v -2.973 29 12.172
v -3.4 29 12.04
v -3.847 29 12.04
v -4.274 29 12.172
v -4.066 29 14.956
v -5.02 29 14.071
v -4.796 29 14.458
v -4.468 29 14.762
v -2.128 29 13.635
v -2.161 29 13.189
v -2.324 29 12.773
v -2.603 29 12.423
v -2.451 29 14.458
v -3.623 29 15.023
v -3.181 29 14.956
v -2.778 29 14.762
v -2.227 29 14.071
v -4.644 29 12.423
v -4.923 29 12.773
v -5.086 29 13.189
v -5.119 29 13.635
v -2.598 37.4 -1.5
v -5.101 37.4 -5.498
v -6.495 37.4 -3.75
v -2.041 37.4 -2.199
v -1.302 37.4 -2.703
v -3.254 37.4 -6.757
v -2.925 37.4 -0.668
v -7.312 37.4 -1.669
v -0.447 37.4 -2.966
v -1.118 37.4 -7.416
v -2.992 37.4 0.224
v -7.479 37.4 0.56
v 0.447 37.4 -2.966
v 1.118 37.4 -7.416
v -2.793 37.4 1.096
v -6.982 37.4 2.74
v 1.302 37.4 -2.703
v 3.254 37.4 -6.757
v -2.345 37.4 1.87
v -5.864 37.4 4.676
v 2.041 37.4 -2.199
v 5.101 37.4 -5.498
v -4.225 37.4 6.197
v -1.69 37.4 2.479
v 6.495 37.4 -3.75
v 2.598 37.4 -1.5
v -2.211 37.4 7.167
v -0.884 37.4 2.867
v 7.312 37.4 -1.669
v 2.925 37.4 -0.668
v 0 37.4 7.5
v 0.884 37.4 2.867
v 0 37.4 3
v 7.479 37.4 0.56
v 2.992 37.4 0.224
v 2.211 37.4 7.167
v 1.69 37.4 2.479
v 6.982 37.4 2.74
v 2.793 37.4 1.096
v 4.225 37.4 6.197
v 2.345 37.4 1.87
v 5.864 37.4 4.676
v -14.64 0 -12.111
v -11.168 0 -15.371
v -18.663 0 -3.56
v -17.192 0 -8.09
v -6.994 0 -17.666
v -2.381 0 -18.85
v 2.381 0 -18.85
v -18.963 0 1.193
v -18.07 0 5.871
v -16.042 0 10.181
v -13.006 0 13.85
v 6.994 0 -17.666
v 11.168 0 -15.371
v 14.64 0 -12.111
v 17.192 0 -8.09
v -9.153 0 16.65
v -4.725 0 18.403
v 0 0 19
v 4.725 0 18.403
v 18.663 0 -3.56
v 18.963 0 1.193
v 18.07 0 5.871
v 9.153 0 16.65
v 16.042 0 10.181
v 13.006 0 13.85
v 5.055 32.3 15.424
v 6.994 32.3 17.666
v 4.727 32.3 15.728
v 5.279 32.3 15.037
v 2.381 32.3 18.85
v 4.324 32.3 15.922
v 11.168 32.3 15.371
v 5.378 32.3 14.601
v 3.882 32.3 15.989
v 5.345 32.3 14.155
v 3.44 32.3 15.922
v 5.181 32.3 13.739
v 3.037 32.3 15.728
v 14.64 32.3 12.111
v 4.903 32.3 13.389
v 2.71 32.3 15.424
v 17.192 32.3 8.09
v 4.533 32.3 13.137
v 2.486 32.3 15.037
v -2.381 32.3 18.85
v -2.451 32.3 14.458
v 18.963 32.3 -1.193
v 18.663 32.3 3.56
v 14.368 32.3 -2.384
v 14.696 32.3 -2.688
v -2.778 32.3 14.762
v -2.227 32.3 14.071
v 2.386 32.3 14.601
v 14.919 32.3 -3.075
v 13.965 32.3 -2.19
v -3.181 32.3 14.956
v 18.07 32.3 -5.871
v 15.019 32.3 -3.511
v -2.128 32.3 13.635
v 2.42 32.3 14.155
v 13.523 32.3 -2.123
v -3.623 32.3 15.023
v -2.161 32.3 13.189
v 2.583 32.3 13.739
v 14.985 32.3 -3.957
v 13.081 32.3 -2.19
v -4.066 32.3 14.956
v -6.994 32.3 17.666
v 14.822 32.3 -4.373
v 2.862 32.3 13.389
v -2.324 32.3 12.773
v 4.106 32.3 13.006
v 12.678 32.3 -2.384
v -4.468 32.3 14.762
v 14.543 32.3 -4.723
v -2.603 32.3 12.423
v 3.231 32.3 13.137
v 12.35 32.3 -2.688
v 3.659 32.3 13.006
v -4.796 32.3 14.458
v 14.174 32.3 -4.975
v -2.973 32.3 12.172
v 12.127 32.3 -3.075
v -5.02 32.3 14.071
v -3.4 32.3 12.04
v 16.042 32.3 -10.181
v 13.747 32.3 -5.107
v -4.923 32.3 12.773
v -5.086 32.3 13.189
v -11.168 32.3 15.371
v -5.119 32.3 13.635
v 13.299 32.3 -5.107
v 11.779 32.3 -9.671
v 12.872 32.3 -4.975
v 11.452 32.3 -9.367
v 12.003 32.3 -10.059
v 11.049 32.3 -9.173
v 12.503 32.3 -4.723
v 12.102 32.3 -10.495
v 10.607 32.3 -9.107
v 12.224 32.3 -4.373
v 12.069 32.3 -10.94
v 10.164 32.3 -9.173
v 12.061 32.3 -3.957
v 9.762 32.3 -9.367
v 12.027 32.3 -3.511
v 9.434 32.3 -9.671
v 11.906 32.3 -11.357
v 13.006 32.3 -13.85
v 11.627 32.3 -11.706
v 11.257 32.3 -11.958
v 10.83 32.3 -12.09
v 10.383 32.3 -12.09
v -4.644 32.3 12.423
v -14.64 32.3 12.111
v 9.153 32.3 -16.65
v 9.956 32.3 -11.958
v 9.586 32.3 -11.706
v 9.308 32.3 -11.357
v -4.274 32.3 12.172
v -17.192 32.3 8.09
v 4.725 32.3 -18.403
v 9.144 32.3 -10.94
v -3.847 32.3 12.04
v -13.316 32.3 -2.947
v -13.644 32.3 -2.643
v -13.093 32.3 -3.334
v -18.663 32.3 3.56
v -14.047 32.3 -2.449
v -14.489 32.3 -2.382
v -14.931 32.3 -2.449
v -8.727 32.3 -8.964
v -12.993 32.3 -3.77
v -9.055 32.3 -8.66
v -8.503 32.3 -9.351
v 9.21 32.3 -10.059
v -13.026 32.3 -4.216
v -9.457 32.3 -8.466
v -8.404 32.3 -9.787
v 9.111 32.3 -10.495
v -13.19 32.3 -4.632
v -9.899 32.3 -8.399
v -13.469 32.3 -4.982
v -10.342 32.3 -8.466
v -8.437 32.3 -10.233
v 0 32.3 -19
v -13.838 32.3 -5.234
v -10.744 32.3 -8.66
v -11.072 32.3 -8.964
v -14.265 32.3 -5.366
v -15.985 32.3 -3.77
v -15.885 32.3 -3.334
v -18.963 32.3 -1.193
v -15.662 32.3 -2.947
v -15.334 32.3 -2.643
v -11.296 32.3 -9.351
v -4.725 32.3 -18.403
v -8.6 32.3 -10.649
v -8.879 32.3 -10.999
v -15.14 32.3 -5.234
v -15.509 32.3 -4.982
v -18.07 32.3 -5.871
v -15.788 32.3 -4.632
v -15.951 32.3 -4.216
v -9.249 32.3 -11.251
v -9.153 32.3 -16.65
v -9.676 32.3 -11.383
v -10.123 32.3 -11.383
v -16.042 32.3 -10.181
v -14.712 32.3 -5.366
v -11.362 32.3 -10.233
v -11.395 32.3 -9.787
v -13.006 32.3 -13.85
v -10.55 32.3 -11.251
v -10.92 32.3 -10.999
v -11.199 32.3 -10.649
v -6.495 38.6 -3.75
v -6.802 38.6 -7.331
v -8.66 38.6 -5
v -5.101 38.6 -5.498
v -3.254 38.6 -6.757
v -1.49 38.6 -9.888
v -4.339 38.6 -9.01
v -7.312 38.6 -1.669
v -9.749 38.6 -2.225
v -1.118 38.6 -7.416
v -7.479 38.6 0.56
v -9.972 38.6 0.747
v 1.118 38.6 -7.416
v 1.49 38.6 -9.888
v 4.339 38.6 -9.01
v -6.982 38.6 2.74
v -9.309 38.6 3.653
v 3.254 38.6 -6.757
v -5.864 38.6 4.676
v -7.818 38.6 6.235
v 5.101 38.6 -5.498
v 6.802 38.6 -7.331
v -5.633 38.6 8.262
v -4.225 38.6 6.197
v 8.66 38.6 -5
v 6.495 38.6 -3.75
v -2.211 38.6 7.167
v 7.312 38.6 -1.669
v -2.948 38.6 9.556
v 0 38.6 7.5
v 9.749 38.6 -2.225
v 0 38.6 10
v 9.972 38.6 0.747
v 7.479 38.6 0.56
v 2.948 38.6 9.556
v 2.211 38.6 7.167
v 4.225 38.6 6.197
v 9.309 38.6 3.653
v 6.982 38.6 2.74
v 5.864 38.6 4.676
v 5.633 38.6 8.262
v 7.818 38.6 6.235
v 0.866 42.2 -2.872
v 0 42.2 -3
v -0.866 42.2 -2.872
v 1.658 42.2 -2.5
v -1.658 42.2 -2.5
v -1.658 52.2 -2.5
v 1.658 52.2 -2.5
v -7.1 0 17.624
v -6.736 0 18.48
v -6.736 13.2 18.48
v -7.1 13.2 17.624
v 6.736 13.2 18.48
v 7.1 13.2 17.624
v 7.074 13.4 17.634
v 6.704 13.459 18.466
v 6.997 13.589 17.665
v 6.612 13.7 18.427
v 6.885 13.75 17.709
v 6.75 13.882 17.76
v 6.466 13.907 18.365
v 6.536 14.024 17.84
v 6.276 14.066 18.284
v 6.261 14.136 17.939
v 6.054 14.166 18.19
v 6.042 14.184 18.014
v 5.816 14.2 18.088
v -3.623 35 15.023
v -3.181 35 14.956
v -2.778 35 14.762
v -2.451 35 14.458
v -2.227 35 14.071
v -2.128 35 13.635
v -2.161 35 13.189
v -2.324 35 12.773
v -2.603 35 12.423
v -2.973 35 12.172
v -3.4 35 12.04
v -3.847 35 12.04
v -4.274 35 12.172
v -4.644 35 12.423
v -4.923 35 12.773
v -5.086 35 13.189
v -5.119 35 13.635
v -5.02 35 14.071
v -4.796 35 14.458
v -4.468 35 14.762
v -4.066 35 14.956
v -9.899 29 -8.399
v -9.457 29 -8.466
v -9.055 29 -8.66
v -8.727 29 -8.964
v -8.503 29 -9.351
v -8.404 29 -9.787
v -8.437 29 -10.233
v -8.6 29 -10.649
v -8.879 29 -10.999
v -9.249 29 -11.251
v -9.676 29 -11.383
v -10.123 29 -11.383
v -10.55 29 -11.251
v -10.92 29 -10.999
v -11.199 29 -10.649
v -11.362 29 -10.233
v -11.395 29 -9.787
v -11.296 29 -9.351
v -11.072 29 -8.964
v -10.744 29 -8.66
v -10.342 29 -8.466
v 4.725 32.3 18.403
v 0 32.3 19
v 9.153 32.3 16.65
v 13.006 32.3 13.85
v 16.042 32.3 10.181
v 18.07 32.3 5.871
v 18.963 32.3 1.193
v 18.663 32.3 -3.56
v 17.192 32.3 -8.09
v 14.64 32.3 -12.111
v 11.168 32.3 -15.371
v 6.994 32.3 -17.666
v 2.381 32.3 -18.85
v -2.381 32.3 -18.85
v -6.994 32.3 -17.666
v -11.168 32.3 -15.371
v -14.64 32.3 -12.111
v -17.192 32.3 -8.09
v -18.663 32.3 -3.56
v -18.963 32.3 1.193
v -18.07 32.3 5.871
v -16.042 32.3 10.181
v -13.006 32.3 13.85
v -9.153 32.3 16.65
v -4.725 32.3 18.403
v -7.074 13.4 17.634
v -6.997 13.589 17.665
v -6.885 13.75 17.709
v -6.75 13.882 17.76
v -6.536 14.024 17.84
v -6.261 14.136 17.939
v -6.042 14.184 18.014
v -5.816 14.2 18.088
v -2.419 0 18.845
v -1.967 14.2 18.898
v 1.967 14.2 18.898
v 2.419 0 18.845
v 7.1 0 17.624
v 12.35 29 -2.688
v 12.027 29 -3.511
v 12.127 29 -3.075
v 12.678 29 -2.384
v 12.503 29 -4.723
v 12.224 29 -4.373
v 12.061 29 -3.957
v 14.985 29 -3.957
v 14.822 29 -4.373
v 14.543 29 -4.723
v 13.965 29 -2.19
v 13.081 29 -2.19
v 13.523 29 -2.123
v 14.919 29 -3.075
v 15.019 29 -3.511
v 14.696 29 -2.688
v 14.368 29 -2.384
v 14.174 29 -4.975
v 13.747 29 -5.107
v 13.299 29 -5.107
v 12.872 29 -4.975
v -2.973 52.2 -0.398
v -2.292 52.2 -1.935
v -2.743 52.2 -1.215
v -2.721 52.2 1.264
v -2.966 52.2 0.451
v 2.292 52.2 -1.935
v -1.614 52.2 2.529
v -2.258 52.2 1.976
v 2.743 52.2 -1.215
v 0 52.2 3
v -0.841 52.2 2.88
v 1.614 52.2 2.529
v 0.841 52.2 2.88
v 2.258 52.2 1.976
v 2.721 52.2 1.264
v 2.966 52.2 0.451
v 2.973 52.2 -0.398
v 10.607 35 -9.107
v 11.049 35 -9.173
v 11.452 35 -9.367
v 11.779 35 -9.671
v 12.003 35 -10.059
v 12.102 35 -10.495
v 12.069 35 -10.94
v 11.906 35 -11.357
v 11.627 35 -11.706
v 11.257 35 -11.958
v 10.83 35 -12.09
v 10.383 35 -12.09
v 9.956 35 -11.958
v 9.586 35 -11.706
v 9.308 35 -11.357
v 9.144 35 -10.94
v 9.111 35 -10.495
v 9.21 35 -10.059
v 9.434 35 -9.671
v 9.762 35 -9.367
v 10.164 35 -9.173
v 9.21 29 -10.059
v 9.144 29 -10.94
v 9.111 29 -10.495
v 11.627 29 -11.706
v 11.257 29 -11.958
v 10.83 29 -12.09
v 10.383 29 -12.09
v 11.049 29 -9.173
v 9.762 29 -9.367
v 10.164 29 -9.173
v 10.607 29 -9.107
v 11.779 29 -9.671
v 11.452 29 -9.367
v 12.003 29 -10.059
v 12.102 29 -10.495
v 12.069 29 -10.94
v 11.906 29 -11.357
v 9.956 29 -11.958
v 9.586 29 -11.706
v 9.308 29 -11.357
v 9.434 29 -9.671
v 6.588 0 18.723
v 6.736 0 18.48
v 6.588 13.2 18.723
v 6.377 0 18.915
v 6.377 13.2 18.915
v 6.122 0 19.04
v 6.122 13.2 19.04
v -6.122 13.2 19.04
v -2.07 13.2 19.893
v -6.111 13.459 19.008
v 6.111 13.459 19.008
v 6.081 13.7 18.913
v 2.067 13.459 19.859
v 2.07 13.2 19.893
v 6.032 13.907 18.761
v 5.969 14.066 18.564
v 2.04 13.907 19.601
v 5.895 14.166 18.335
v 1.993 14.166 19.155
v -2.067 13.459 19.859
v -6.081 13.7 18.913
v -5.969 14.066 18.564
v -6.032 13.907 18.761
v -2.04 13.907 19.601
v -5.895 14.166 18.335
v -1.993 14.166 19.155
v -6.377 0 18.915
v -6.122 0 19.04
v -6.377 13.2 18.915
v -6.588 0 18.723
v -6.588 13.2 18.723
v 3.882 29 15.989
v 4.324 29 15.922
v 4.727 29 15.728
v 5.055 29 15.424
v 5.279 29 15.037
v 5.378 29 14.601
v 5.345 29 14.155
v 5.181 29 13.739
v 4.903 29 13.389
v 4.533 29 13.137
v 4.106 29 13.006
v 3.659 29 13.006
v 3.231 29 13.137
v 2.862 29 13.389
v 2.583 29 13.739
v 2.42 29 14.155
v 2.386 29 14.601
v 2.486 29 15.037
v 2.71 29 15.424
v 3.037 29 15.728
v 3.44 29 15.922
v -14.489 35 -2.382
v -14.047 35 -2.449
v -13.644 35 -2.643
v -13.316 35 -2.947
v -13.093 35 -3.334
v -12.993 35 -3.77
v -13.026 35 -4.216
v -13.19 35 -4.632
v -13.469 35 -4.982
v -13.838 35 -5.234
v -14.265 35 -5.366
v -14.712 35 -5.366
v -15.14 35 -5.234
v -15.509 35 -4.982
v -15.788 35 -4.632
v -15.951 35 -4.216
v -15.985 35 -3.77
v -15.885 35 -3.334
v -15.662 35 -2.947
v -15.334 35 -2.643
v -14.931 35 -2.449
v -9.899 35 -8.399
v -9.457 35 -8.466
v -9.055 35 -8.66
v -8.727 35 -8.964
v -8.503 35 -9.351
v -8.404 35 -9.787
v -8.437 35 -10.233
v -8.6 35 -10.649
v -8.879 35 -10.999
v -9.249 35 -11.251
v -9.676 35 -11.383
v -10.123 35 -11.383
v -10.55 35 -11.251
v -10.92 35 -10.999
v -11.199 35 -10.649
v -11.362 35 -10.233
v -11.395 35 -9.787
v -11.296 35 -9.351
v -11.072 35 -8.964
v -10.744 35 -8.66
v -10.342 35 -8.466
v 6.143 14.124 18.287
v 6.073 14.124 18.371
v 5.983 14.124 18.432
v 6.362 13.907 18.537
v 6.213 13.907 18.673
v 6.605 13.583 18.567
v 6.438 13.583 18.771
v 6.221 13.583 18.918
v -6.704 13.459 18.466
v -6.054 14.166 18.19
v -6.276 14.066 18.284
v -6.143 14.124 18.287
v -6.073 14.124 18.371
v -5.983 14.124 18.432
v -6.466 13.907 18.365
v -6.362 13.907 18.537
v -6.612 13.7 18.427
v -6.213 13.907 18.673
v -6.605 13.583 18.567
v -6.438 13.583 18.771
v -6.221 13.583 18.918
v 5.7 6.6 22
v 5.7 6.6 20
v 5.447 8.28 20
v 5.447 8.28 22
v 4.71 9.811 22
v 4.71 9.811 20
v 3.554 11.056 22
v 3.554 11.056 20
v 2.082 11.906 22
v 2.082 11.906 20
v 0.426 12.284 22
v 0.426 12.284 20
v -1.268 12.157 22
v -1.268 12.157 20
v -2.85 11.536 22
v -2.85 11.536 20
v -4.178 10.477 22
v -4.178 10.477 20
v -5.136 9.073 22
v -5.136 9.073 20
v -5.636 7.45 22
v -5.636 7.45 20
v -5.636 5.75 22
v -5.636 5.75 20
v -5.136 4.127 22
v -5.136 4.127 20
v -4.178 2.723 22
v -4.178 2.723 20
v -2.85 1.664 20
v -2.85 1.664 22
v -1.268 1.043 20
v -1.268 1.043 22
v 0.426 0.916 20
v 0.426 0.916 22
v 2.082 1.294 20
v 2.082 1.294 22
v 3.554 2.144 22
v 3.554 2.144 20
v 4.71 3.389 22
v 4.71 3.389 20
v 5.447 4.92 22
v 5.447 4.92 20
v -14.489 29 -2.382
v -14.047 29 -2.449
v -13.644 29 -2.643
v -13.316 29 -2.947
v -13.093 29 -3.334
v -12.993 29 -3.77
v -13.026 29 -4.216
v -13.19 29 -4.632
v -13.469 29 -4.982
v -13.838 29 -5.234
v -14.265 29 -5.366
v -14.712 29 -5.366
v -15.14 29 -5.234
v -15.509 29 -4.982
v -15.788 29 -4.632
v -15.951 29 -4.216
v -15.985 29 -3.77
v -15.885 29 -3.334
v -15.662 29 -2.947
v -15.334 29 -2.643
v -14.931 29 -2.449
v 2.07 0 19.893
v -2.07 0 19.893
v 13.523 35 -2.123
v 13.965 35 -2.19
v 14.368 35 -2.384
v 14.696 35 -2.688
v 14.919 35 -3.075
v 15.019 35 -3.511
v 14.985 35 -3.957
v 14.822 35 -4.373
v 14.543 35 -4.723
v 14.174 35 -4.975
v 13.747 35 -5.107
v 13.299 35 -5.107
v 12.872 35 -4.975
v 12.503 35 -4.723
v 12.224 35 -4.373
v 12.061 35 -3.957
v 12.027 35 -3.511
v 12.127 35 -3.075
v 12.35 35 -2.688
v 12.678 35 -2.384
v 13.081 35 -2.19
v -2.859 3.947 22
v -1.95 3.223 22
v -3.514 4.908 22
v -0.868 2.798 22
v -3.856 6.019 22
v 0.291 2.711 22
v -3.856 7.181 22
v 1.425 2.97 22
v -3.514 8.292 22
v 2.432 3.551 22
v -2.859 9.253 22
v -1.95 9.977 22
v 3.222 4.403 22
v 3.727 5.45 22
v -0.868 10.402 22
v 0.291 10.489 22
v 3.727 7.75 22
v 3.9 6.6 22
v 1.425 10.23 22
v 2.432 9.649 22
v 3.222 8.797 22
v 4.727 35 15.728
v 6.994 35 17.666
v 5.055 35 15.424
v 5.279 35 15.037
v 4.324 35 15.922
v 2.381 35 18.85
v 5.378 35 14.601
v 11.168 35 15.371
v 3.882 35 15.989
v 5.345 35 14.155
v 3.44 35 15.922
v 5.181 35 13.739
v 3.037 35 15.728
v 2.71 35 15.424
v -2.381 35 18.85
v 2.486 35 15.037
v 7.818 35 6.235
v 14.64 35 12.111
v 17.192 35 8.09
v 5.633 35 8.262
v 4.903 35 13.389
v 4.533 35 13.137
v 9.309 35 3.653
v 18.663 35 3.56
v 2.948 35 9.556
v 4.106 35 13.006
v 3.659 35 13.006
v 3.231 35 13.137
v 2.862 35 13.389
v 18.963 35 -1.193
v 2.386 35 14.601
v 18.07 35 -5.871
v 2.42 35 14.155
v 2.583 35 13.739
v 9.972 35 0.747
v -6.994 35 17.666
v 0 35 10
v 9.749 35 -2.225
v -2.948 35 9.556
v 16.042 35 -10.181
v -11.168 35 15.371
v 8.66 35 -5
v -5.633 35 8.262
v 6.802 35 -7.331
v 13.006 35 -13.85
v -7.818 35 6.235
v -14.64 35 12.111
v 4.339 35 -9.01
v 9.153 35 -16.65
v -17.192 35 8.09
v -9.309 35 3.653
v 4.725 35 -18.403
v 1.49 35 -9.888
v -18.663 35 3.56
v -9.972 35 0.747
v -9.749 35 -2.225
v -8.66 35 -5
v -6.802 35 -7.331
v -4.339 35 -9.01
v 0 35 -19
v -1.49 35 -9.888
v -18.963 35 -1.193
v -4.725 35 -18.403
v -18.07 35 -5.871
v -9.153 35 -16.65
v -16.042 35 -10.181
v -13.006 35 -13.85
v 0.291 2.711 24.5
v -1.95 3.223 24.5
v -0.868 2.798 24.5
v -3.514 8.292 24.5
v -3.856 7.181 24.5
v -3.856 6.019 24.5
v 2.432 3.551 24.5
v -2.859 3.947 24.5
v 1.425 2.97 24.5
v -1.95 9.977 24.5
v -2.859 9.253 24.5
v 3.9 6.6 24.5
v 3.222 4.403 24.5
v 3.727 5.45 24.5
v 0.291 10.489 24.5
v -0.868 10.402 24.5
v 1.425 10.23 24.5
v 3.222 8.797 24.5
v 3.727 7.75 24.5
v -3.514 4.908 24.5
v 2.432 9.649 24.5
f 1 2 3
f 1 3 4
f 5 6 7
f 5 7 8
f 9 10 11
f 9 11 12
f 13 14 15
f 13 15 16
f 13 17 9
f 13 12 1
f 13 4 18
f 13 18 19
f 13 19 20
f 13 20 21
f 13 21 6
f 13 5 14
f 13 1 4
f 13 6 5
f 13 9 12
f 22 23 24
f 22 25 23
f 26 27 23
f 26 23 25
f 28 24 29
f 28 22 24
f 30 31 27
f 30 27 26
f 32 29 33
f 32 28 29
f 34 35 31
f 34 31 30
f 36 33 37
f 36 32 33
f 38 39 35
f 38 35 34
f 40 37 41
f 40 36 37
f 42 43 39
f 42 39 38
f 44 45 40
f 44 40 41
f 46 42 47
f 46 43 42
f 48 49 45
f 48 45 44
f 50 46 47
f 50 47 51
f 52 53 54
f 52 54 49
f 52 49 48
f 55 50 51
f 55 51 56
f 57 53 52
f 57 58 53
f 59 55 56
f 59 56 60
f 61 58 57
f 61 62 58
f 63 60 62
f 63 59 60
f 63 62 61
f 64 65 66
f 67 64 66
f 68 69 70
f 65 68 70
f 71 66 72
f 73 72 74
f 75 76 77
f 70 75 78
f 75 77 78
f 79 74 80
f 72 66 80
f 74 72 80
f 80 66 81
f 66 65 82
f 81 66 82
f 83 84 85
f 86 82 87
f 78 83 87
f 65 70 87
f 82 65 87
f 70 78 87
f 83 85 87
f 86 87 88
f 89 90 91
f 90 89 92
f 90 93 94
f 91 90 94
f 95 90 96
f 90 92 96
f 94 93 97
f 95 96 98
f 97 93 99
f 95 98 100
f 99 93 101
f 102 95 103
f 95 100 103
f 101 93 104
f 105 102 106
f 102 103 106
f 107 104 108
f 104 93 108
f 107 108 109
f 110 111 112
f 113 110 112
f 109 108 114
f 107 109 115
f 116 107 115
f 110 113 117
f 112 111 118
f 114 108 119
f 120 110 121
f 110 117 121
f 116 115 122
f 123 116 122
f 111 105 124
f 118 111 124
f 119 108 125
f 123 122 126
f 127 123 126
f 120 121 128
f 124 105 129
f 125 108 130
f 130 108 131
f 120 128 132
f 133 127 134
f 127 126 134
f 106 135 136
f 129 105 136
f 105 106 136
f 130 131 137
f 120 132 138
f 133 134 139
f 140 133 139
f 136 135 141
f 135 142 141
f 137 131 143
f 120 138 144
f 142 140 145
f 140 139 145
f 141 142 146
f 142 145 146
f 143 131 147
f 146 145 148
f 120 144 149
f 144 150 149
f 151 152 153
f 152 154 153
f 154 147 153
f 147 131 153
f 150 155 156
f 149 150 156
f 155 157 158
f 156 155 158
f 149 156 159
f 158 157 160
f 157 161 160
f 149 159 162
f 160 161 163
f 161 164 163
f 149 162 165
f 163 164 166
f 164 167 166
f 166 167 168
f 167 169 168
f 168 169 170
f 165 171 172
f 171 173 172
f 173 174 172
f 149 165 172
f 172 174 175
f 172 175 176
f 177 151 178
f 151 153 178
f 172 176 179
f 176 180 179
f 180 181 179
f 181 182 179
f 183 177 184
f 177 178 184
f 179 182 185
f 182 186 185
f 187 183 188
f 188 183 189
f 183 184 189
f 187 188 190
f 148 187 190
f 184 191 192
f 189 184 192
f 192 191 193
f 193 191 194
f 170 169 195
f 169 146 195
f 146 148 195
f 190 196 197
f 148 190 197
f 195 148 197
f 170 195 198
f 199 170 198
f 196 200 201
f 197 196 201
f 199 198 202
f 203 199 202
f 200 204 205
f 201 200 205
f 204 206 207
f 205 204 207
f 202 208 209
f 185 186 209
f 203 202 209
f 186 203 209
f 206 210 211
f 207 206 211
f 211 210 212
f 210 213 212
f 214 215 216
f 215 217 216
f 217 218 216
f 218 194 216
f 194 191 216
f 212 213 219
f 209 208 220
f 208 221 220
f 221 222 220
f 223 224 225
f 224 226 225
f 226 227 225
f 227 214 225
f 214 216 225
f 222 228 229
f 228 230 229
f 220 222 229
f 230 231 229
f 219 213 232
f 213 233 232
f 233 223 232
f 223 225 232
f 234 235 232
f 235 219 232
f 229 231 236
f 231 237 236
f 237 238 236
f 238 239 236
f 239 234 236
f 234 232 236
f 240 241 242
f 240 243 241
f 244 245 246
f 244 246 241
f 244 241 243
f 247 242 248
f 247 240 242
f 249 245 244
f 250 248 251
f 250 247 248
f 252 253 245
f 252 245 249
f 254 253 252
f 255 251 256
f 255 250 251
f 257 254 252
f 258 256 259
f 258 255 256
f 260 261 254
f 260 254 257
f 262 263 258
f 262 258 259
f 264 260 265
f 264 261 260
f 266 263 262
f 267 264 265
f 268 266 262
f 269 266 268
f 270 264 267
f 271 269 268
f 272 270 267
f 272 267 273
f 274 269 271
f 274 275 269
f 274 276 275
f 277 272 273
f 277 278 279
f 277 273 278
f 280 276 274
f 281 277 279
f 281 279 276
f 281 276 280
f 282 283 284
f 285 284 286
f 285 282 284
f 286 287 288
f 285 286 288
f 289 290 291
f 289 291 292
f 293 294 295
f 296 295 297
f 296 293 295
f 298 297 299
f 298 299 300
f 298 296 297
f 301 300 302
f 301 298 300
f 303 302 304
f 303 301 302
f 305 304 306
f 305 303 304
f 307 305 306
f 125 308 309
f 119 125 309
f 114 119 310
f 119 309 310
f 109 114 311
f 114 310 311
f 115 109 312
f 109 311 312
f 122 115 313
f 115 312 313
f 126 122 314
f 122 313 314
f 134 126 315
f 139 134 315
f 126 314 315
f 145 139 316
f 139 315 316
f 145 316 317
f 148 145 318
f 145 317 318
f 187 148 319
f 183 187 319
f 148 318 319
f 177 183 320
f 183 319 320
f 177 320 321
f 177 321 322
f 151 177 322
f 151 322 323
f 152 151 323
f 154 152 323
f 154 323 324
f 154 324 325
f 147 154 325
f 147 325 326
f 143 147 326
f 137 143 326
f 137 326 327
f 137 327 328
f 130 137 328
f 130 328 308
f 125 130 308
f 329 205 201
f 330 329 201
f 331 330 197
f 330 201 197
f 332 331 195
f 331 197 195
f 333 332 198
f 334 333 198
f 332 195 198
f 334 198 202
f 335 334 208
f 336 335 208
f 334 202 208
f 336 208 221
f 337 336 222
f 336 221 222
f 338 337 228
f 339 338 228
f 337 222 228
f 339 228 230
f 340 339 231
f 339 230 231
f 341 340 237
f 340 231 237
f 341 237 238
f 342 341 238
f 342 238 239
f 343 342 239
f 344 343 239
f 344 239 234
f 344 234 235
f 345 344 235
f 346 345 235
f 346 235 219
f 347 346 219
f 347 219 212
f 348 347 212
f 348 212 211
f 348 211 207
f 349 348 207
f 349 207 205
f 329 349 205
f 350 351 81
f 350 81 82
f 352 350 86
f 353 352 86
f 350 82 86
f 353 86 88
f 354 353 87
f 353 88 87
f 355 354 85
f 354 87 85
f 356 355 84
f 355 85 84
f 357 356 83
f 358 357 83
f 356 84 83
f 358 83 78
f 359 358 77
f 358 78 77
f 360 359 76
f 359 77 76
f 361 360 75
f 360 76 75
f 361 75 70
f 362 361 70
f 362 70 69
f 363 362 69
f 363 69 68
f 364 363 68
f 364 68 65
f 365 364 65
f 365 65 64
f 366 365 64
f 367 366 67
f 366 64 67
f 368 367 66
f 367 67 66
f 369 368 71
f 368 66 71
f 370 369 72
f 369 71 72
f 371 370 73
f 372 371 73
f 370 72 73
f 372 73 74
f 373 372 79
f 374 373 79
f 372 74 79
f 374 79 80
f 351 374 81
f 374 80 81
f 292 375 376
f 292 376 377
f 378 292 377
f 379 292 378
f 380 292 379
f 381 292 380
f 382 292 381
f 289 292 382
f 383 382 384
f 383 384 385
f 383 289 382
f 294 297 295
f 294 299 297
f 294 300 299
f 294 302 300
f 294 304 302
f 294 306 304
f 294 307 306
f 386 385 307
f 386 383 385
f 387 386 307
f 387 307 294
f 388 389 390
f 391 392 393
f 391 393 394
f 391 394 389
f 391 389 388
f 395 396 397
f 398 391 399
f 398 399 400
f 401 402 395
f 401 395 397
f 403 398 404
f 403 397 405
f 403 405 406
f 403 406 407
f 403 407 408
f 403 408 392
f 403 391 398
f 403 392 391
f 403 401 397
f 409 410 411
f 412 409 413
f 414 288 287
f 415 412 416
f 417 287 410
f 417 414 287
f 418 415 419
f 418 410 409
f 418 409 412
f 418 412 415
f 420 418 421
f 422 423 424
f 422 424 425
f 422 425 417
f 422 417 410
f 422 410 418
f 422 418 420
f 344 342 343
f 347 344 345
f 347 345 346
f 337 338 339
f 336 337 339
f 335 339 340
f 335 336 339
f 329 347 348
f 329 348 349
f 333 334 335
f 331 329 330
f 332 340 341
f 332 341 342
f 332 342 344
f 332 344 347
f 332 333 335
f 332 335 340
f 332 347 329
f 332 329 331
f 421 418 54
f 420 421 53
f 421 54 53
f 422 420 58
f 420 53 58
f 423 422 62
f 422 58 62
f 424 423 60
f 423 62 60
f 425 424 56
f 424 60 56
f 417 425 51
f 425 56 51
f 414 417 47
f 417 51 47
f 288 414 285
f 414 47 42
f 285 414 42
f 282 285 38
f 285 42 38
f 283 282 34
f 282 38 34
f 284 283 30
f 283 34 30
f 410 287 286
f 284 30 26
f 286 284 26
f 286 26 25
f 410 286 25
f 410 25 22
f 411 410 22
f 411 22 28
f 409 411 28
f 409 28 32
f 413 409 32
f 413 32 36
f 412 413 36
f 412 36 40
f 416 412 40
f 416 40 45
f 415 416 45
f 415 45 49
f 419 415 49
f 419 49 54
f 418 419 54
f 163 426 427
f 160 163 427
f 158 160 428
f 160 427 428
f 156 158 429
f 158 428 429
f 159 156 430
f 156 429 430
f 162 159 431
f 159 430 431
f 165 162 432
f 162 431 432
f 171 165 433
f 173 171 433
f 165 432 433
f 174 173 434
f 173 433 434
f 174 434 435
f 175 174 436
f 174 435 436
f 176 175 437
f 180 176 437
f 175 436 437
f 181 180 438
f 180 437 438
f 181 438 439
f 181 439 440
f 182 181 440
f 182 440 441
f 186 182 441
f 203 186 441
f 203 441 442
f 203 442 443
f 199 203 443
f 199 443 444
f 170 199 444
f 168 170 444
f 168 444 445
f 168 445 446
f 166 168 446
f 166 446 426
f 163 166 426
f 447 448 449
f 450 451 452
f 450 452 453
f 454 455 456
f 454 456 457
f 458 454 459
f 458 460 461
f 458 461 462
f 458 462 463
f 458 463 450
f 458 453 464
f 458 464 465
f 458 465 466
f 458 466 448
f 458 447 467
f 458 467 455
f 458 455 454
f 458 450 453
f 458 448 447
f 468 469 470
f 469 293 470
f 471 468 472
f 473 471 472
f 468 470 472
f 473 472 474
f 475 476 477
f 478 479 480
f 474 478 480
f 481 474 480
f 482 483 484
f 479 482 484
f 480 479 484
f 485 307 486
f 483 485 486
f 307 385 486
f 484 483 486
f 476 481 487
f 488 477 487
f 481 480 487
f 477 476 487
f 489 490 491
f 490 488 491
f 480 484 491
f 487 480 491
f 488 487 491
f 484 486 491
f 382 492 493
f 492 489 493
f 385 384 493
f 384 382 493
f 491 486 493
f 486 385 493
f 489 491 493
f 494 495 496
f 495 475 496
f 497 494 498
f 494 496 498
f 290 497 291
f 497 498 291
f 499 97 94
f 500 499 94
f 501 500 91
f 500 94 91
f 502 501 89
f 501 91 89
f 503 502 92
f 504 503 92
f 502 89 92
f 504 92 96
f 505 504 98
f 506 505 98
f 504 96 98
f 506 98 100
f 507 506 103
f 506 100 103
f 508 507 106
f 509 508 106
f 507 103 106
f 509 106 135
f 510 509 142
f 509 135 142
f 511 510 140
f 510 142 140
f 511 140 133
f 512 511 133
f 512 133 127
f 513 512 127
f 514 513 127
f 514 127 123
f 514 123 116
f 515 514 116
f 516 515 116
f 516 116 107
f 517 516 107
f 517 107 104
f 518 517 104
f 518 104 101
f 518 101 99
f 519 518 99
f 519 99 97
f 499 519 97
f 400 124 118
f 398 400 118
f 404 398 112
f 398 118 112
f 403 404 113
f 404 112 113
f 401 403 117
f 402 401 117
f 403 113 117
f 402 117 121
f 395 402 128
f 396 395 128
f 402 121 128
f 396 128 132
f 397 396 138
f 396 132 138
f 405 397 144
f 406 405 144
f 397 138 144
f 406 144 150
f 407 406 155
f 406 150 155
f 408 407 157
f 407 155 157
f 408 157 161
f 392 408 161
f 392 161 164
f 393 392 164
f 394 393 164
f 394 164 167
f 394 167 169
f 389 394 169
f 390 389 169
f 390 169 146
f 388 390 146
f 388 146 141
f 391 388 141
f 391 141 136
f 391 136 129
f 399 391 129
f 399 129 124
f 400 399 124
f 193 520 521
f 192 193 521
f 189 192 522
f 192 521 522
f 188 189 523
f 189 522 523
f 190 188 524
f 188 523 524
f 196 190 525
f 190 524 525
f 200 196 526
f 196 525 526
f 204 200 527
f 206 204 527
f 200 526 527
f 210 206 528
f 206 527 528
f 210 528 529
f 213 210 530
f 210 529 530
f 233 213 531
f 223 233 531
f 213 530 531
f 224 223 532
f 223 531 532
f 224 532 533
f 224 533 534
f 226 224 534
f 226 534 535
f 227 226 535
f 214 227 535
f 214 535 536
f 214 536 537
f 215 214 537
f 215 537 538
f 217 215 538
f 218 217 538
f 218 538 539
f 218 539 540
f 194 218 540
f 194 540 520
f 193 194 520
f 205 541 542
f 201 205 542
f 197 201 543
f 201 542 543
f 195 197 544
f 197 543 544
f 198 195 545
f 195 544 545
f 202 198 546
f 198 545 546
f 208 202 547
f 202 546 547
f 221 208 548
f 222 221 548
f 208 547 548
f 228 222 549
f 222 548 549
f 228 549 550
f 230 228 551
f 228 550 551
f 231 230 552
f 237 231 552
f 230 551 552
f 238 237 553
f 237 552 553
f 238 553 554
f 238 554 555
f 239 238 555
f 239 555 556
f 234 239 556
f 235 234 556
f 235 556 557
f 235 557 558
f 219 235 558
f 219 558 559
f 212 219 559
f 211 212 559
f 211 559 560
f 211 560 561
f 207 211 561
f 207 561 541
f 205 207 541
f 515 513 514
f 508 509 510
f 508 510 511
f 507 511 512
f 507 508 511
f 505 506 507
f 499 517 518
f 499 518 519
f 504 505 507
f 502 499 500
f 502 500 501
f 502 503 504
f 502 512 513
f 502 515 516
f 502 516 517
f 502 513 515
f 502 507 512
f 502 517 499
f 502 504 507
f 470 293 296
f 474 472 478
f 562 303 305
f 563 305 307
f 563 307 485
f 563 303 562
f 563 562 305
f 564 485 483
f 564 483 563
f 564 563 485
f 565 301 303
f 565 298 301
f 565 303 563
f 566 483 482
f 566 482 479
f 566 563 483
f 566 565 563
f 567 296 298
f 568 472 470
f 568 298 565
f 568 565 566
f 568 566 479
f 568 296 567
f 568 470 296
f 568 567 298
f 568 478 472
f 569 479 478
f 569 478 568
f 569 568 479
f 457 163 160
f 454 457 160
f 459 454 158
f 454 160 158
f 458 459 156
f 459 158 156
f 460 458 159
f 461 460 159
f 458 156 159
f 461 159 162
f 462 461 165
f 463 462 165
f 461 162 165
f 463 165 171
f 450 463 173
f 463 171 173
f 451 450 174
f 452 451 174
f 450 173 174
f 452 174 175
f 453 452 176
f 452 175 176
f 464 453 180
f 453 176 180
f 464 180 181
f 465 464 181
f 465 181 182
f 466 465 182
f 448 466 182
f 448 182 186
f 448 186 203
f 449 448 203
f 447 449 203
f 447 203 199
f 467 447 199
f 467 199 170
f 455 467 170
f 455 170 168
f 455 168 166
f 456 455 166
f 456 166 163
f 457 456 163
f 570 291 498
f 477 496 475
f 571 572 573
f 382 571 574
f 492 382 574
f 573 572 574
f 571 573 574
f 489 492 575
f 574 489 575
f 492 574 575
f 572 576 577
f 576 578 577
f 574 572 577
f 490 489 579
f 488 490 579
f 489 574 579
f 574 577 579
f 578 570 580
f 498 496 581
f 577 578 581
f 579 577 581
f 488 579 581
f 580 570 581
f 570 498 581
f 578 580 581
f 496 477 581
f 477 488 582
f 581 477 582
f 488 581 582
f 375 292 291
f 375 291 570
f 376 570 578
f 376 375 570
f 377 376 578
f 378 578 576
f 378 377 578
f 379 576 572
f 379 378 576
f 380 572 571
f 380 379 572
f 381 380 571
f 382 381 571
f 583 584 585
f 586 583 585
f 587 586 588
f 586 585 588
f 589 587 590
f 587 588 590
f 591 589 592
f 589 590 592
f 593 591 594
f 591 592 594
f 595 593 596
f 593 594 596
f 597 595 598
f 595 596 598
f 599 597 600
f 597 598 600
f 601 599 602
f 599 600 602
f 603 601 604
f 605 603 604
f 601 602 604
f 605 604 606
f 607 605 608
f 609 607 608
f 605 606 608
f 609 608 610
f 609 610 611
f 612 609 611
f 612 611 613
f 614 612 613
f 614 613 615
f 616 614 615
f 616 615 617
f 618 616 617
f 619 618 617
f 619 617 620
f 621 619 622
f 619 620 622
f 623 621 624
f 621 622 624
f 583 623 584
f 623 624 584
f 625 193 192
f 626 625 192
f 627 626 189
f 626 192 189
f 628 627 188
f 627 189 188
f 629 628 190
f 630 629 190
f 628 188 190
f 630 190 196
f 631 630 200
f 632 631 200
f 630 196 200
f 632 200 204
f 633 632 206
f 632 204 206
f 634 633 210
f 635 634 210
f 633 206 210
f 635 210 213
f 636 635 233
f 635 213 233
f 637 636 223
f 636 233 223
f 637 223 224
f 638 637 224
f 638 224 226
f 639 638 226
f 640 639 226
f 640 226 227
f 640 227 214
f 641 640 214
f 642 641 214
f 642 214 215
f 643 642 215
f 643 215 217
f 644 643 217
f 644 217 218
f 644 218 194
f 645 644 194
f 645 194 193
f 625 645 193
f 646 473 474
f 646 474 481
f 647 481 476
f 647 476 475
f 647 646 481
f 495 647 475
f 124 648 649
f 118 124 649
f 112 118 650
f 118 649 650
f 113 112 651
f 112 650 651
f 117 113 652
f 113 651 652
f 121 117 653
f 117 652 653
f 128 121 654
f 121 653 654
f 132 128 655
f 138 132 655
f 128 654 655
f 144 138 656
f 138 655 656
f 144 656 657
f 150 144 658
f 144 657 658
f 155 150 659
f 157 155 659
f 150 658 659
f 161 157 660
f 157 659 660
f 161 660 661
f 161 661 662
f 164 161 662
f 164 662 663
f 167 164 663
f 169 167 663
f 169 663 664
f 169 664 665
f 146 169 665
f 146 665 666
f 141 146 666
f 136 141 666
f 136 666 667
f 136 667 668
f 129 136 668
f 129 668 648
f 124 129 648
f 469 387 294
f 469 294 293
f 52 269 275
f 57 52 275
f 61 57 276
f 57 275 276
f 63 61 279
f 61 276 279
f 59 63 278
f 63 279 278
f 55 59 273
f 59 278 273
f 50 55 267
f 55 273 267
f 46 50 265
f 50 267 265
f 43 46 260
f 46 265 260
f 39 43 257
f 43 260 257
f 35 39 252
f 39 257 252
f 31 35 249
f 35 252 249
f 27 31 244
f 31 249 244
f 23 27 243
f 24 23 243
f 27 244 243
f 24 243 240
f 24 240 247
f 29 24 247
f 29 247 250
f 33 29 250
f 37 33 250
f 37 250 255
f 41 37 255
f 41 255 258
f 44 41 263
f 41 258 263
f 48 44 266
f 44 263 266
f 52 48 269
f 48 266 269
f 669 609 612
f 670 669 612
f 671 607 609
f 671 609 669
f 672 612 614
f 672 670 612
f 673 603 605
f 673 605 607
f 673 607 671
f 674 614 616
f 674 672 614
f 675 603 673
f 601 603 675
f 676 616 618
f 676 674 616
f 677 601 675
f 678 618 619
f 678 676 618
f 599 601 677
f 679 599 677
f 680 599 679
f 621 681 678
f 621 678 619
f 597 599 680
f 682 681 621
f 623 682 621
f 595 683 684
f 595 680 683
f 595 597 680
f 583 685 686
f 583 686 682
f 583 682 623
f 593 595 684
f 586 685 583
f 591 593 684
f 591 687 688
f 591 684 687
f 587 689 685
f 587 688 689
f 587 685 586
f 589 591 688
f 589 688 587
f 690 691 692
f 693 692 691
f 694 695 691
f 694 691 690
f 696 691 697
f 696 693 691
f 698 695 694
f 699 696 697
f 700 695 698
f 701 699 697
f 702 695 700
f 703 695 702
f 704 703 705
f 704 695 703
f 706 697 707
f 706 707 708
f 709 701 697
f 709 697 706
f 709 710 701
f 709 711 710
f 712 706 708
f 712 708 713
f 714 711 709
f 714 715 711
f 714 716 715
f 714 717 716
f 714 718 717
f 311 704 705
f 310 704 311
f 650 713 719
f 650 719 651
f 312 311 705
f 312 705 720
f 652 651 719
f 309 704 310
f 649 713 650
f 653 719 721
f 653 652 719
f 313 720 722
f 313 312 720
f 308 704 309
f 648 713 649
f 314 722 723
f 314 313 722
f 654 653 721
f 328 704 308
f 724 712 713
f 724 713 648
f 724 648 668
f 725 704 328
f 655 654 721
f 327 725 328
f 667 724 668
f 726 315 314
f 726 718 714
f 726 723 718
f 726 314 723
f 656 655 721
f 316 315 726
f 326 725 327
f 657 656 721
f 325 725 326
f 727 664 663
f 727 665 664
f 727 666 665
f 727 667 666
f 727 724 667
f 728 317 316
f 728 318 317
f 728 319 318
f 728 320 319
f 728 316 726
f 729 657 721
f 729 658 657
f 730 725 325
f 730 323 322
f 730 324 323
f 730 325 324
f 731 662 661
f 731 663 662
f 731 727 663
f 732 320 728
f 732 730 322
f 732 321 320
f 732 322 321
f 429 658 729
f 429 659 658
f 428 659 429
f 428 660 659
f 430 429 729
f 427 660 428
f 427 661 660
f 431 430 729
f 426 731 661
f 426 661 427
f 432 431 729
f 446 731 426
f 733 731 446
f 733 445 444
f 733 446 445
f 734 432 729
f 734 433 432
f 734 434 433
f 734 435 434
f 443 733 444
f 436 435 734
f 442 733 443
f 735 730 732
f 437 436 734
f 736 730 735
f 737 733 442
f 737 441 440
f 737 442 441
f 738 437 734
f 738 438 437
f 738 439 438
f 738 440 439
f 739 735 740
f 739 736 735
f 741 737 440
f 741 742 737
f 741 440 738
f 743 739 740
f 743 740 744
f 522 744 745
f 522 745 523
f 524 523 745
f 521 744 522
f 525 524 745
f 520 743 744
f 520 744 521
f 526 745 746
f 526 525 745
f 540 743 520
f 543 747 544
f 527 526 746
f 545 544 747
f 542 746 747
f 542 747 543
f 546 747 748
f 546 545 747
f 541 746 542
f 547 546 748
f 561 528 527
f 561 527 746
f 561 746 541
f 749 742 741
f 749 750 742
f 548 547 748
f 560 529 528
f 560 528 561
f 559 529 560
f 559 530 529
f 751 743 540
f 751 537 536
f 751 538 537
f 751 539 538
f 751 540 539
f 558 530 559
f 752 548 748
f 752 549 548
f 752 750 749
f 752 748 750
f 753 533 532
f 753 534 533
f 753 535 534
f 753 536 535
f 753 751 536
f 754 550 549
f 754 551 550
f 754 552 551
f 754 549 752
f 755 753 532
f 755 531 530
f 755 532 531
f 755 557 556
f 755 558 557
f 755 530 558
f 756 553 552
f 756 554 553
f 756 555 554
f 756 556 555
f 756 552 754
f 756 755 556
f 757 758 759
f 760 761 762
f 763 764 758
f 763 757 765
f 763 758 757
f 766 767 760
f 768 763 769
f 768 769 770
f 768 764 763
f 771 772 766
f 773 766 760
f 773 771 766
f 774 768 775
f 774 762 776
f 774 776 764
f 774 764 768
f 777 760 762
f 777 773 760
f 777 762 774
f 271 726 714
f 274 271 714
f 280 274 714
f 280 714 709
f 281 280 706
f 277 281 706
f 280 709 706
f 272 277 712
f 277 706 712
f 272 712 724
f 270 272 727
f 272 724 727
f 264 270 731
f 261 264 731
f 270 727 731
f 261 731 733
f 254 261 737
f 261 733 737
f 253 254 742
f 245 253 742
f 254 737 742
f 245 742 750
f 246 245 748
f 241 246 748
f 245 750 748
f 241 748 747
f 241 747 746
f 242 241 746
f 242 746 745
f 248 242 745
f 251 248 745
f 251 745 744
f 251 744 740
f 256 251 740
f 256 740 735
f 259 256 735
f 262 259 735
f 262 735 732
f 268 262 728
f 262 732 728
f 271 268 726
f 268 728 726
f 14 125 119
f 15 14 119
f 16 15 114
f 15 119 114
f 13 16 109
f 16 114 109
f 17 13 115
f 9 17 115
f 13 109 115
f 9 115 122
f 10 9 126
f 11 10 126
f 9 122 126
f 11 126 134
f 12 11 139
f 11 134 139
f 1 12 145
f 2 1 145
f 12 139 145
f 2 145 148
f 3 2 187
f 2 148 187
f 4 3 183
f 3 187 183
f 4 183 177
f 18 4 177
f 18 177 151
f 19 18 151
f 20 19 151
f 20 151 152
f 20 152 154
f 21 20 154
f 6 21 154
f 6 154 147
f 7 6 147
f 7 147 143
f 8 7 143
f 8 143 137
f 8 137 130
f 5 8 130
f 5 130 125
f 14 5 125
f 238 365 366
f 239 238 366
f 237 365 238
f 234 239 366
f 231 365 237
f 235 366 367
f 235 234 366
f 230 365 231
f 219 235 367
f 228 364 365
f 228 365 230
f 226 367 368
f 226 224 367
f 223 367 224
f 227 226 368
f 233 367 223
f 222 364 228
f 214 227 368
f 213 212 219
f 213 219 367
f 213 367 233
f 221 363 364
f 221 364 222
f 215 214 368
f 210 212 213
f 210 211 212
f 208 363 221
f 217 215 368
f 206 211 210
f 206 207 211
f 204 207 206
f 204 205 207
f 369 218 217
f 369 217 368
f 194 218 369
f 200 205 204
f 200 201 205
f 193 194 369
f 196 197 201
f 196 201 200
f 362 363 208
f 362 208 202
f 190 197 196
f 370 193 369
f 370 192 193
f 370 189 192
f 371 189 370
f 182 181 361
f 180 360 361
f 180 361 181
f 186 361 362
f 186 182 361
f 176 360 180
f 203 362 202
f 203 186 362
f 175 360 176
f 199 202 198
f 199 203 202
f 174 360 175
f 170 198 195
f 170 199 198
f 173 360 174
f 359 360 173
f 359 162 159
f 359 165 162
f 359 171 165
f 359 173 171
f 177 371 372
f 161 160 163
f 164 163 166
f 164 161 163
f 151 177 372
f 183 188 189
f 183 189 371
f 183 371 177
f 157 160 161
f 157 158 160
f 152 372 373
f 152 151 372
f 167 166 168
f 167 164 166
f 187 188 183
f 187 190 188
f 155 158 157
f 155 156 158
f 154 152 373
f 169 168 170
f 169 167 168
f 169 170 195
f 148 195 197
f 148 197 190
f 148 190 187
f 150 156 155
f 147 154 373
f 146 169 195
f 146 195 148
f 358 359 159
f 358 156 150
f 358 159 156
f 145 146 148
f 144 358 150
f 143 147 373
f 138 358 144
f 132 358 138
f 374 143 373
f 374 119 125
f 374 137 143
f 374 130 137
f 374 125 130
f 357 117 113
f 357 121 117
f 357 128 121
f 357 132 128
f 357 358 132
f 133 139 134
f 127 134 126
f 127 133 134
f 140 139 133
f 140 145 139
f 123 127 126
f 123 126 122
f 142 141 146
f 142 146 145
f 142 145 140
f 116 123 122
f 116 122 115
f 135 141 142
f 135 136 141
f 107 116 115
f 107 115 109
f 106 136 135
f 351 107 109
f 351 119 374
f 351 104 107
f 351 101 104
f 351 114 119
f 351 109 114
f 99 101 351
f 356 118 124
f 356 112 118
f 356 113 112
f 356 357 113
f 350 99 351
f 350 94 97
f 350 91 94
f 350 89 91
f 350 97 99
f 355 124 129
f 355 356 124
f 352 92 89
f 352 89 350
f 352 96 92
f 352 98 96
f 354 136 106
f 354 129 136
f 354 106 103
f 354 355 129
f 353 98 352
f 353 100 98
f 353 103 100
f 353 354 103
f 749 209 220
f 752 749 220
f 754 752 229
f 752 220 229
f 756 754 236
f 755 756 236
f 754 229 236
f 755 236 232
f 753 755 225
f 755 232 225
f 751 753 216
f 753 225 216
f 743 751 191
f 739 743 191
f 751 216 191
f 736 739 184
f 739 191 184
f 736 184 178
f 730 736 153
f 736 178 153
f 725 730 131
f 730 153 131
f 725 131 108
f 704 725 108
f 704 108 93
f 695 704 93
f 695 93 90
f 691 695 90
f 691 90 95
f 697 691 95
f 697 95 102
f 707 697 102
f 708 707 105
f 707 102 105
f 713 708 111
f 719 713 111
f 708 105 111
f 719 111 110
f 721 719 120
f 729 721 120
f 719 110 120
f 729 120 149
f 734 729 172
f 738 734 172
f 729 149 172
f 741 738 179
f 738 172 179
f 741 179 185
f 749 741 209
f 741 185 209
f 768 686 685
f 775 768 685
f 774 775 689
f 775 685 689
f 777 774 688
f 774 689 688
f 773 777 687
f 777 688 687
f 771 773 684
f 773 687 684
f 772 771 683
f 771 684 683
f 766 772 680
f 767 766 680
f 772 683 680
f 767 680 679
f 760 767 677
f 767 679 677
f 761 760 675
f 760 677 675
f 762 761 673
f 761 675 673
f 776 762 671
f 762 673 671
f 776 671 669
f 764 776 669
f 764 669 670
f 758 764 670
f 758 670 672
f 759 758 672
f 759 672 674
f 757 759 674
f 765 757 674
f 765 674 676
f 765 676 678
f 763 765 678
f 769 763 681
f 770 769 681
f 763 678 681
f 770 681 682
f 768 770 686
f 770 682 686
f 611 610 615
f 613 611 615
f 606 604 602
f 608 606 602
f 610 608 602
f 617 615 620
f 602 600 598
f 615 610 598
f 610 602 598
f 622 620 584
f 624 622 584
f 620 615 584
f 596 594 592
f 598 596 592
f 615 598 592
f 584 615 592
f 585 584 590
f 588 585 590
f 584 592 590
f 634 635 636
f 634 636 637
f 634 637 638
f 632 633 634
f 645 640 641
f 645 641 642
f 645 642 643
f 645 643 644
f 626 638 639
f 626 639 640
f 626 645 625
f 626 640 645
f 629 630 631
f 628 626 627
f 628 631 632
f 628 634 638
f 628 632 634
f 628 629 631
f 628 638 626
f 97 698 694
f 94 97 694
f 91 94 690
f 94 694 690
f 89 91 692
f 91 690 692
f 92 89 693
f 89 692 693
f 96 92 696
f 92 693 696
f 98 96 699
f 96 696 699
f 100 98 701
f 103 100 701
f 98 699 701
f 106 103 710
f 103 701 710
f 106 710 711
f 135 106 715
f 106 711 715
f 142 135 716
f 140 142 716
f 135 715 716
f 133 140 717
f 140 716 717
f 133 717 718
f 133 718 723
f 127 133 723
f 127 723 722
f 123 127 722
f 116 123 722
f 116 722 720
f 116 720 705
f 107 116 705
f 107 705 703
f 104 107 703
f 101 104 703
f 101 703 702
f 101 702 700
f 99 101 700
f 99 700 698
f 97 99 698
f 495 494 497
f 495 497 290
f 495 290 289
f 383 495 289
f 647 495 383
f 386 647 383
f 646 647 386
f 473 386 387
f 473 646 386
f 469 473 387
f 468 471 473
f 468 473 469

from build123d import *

# Parameters (mm, degrees)
SKETCH2_R               = 18.999999999999996
BOSS_EXTRUDE1_DEPTH     = 32.3
SKETCH3_R               = 18.999999999999996
BOSS_EXTRUDE2_DEPTH     = 2.7
SKETCH4_R               = 1.5000000000000024
SKETCH4_R_2             = 1.5000000000000022
SKETCH4_R_3             = 1.4999999999999998
SKETCH4_R_4             = 1.499999999999997
SKETCH4_R_5             = 1.5000000000000009
CUT_EXTRUDE1_DEPTH      = 6
SKETCH4_3_R             = 10
BOSS_EXTRUDE3_DEPTH     = 3.6
SKETCH5_R               = 7.5
CUT_EXTRUDE2_DEPTH      = 1.2
SKETCH6_R               = 3
BOSS_EXTRUDE4_DEPTH     = 14.8
CUT_EXTRUDE3_DEPTH      = 59.70979475351621
CUT_EXTRUDE3_DEPTH_BACK = 10
BOSS_EXTRUDE5_DEPTH     = 14.2
FILLET1_R               = 1
SKETCH9_R               = 5.7
BOSS_EXTRUDE6_DEPTH     = 2
SKETCH10_R              = 3.9000000000000004
BOSS_EXTRUDE7_DEPTH     = 2.5


with BuildPart() as part:
    # Sketch2 → Boss-Extrude1 (new body)
    with BuildSketch(Plane(origin=(0, 0, 0), x_dir=(1, 0, 0), z_dir=(0, 1, 0))):
        with Locations(Location((0, 0, 0), (0, 0, 270))):
            Circle(SKETCH2_R)
    extrude(amount=BOSS_EXTRUDE1_DEPTH)


with BuildPart() as body_2:
    # Sketch3 → Boss-Extrude2 (new body)
    with BuildSketch(Plane(origin=(0, 32.3, 0), x_dir=(1, 0, 0), z_dir=(0, 1, 0))):
        with Locations(Location((0, 0, 0), (0, 0, 90))):
            Circle(SKETCH3_R)
    extrude(amount=BOSS_EXTRUDE2_DEPTH)


with BuildPart() as cut_extrude1_tool:
    # Sketch4 → Cut-Extrude1 (new body)
    with BuildSketch(Plane(origin=(0, 34.99999999999999, 0), x_dir=(1, 0, 0), z_dir=(0, 1, 0))):
        with Locations(Location((-9.899494936611665, 9.899494936611667, 0), (0, 0, 270))):
            Circle(SKETCH4_R)
        with Locations(Location((-14.48888739433603, 3.8822856765377947, 0), (0, 0, 270))):
            Circle(SKETCH4_R_2)
        with Locations(Location((-3.6234666314352975, -13.522961568046956, 0), (0, 0, 270))):
            Circle(SKETCH4_R_3)
        with Locations(Location((3.882285676537826, -14.488887394336023, 0), (0, 0, 270))):
            Circle(SKETCH4_R_3)
        with Locations(Location((13.522961568046957, 3.623466631435291, 0), (0, 0, 270))):
            Circle(SKETCH4_R_4)
        with Locations(Location((10.606601717798199, 10.60660171779823, 0), (0, 0, 270))):
            Circle(SKETCH4_R_5)
    extrude(amount=-CUT_EXTRUDE1_DEPTH)


with BuildPart() as part_1:
    add(part.part)

    # Cut-Extrude1: cut by cut_extrude1_tool
    add(cut_extrude1_tool.part, mode=Mode.SUBTRACT)


with BuildPart() as body_2_1:
    add(body_2.part)

    # Cut-Extrude1: cut by cut_extrude1_tool
    add(cut_extrude1_tool.part, mode=Mode.SUBTRACT)

    # Sketch4<3> → Boss-Extrude3 (add)
    with BuildSketch(Plane(origin=(0, 34.99999999999999, 0), x_dir=(1, 0, 0), z_dir=(0, 1, 0))):
        with Locations(Location((0, 0, 0), (0, 0, 270))):
            Circle(SKETCH4_3_R)
    extrude(amount=BOSS_EXTRUDE3_DEPTH)

    # Sketch5 → Cut-Extrude2 (cut)
    with BuildSketch(Plane(origin=(0, 38.599999999999994, 0), x_dir=(1, 0, 0), z_dir=(0, 1, 0))):
        with Locations(Location((0, 0, 0), (0, 0, 270))):
            Circle(SKETCH5_R)
    extrude(amount=-CUT_EXTRUDE2_DEPTH, mode=Mode.SUBTRACT)

    # Sketch6 → Boss-Extrude4 (add)
    with BuildSketch(Plane(origin=(0, 37.4, 0), x_dir=(1, 0, 0), z_dir=(0, 1, 0))):
        with Locations(Location((0, 0, 0), (0, 0, 270))):
            Circle(SKETCH6_R)
    extrude(amount=BOSS_EXTRUDE4_DEPTH)

    # Sketch7 → Cut-Extrude3 (cut, two sides: drawn at the far end of the back side and taken through both)
    with BuildSketch(Plane(origin=(0, 52.199999999999996, 0), x_dir=(1, 0, 0), z_dir=(0, 1, 0)).offset(-CUT_EXTRUDE3_DEPTH_BACK)):
        Polygon((-71.29105075312172, 2.5), (-1.6583123951777008, 2.5), (1.6583123951777008, 2.5), (71.29105075312172, 2.5), (71.29105075312172, 141.76547671588804), (-71.29105075312172, 141.76547671588804), align=None)
    extrude(amount=CUT_EXTRUDE3_DEPTH + CUT_EXTRUDE3_DEPTH_BACK, mode=Mode.SUBTRACT)


with BuildPart() as body_3:
    # Sketch8 → Boss-Extrude5 (new body)
    with BuildSketch(Plane.XZ):
        with BuildLine():
            ThreePointArc((-7.1000000000000005, 17.623563771269417), (-3.616095155404414, 18.652717116470207), (3.5133e-13, 18.999999999999996))
            Line((0, 18.999999999999996), (0, 20))
            ThreePointArc((1.22e-15, 20), (-0.6540571990327249, 19.989302368526857), (-1.3074147117776902, 19.957220918039347))
            Line((-1.3074147117776898, 19.95722091803935), (-7.099999999999999, 17.623563771269414))
        make_face()
        with BuildLine():
            Line((-6.559330631564653, 18.893786853508686), (-7.099999999999999, 17.623563771269414))
            Line((-7.099999999999999, 17.623563771269414), (-1.3074147117776898, 19.95722091803935))
            ThreePointArc((-1.3074147117776902, 19.957220918039347), (-3.969148973854553, 19.602190092521532), (-6.559330631564651, 18.893786853508686))
        make_face()
        with BuildLine():
            Line((0, 20), (0, 18.999999999999996))
            ThreePointArc((3.5133e-13, 18.999999999999996), (3.6160951554047602, 18.65271711647014), (7.1, 17.623563771269417))
            Line((7.099999999999999, 17.623563771269414), (6.559330631564646, 18.893786853508686))
            ThreePointArc((6.559330631564646, 18.89378685350869), (3.325978271864252, 19.721507765256867), (1.22e-15, 20))
        make_face()
    extrude(amount=-BOSS_EXTRUDE5_DEPTH)

    # Fillet1
    fillet1_edges = [body_3.edges().sort_by_distance(p)[0] for p in [
        (-6.829665315782326, 14.2, 18.25867531238905),
        (6.829665315782322, 14.2, 18.25867531238905),
        (-3.77e-15, 14.2, 20.000000000000007),
        (6.559330631564646, 7.1, 18.893786853508686),
        (-6.559330631564653, 7.1, 18.893786853508686),
    ]]
    fillet(fillet1_edges, radius=FILLET1_R - 0.0001)  # a hair under: the kernel refuses the full size


with BuildPart() as body_4:
    # Sketch9 → Boss-Extrude6 (new body)
    with BuildSketch(Plane.XY.offset(20)):
        with Locations((0, 6.6)):
            Circle(SKETCH9_R)
    extrude(amount=BOSS_EXTRUDE6_DEPTH)

    # Sketch10 → Boss-Extrude7 (add)
    with BuildSketch(Plane.XY.offset(22)):
        with Locations((0, 6.6)):
            Circle(SKETCH10_R)
    extrude(amount=BOSS_EXTRUDE7_DEPTH)


solid = Compound([part_1.part, body_2_1.part, body_3.part, body_4.part])
